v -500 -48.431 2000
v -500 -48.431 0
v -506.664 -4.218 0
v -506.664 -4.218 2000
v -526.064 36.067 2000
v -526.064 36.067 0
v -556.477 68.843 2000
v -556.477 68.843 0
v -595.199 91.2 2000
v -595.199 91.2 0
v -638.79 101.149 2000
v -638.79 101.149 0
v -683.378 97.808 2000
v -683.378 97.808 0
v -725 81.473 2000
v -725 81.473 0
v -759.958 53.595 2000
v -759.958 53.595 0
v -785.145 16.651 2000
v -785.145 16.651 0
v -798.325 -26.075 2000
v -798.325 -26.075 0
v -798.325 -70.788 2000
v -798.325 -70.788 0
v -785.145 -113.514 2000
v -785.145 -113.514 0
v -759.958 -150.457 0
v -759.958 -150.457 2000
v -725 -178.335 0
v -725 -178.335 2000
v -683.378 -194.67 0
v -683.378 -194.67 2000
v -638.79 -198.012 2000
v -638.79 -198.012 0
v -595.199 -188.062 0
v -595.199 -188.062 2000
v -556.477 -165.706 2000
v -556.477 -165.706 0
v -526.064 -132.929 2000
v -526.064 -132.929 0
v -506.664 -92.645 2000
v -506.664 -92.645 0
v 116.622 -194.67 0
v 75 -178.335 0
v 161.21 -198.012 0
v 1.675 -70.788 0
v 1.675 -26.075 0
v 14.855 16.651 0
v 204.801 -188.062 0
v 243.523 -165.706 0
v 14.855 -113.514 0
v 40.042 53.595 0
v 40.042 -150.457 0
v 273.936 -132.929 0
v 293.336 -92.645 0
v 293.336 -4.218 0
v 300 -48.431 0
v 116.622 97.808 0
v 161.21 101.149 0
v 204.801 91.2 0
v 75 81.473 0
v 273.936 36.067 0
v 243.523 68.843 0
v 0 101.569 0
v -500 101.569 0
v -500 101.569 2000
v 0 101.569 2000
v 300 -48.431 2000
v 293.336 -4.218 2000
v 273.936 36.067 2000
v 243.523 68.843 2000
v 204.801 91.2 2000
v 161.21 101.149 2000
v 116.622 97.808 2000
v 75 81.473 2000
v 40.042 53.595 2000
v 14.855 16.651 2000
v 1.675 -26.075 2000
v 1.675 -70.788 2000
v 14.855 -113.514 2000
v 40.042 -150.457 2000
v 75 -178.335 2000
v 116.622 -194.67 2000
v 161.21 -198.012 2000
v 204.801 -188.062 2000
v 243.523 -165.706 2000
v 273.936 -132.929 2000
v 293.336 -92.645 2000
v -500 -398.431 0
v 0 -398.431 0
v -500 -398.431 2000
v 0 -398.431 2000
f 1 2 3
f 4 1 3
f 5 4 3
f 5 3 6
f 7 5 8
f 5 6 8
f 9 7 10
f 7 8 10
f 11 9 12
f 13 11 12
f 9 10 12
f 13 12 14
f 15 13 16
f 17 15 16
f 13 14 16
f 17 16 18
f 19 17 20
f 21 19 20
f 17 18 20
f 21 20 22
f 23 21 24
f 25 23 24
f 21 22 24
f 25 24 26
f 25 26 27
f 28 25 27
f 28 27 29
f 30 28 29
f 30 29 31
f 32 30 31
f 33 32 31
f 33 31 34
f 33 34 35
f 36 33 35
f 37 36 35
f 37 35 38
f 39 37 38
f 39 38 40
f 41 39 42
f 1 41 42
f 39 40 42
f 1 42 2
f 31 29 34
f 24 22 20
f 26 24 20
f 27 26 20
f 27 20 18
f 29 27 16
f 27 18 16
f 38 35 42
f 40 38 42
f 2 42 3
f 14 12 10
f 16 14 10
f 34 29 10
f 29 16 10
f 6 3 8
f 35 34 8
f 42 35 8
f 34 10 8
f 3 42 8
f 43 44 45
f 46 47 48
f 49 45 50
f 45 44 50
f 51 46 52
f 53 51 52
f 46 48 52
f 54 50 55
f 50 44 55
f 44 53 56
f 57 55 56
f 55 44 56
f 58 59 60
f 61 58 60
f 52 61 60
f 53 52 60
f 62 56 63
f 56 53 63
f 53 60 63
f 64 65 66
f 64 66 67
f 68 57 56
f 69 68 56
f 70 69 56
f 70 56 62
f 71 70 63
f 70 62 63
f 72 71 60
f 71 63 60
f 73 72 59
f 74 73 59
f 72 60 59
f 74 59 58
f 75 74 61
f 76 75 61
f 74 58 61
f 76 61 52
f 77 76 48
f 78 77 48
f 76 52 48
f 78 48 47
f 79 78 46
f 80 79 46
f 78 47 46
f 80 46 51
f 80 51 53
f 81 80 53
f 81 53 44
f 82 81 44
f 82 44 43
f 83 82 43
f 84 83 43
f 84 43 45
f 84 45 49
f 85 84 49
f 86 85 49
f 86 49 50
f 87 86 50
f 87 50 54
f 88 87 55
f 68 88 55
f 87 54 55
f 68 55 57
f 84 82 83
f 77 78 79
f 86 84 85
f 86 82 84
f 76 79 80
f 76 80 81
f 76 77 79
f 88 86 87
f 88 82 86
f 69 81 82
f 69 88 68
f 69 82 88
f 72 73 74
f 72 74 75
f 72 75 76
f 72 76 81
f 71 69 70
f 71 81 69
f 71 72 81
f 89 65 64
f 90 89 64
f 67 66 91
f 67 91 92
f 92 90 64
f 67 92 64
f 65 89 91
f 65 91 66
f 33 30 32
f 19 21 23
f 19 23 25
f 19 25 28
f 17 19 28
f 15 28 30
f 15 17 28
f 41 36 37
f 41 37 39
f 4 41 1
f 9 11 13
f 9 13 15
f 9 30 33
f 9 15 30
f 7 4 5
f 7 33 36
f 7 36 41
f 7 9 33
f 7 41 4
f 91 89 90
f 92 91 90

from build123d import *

# Parameters (mm, degrees)
BOSS_EXTRUDE2_DEPTH   = 2000
SKETCH1_R             = 150
BOSS_EXTRUDE2_2_DEPTH = 2000
BOSS_EXTRUDE2_3_DEPTH = 2000


with BuildPart() as part:
    # Sketch1 → Boss-Extrude2 (new body)
    with BuildSketch(Plane.XY):
        Polygon((0, -48.431267813), (0, 101.56873269), (-500, 101.56873269), (-500, -48.43126731), (-500, -398.43126731), (0, -398.43126731), align=None)
    extrude(amount=BOSS_EXTRUDE2_DEPTH)


with BuildPart() as body_2:
    # Sketch1 → Boss-Extrude2 2 (new body)
    with BuildSketch(Plane.XY):
        with Locations((150, -48.43126731)):
            Circle(SKETCH1_R)
    extrude(amount=BOSS_EXTRUDE2_2_DEPTH)


with BuildPart() as body_3:
    # Sketch1 → Boss-Extrude2 3 (new body)
    with BuildSketch(Plane.XY):
        with Locations((-650, -48.43126731)):
            Circle(SKETCH1_R)
    extrude(amount=BOSS_EXTRUDE2_3_DEPTH)


solid = Compound([part.part, body_2.part, body_3.part])
